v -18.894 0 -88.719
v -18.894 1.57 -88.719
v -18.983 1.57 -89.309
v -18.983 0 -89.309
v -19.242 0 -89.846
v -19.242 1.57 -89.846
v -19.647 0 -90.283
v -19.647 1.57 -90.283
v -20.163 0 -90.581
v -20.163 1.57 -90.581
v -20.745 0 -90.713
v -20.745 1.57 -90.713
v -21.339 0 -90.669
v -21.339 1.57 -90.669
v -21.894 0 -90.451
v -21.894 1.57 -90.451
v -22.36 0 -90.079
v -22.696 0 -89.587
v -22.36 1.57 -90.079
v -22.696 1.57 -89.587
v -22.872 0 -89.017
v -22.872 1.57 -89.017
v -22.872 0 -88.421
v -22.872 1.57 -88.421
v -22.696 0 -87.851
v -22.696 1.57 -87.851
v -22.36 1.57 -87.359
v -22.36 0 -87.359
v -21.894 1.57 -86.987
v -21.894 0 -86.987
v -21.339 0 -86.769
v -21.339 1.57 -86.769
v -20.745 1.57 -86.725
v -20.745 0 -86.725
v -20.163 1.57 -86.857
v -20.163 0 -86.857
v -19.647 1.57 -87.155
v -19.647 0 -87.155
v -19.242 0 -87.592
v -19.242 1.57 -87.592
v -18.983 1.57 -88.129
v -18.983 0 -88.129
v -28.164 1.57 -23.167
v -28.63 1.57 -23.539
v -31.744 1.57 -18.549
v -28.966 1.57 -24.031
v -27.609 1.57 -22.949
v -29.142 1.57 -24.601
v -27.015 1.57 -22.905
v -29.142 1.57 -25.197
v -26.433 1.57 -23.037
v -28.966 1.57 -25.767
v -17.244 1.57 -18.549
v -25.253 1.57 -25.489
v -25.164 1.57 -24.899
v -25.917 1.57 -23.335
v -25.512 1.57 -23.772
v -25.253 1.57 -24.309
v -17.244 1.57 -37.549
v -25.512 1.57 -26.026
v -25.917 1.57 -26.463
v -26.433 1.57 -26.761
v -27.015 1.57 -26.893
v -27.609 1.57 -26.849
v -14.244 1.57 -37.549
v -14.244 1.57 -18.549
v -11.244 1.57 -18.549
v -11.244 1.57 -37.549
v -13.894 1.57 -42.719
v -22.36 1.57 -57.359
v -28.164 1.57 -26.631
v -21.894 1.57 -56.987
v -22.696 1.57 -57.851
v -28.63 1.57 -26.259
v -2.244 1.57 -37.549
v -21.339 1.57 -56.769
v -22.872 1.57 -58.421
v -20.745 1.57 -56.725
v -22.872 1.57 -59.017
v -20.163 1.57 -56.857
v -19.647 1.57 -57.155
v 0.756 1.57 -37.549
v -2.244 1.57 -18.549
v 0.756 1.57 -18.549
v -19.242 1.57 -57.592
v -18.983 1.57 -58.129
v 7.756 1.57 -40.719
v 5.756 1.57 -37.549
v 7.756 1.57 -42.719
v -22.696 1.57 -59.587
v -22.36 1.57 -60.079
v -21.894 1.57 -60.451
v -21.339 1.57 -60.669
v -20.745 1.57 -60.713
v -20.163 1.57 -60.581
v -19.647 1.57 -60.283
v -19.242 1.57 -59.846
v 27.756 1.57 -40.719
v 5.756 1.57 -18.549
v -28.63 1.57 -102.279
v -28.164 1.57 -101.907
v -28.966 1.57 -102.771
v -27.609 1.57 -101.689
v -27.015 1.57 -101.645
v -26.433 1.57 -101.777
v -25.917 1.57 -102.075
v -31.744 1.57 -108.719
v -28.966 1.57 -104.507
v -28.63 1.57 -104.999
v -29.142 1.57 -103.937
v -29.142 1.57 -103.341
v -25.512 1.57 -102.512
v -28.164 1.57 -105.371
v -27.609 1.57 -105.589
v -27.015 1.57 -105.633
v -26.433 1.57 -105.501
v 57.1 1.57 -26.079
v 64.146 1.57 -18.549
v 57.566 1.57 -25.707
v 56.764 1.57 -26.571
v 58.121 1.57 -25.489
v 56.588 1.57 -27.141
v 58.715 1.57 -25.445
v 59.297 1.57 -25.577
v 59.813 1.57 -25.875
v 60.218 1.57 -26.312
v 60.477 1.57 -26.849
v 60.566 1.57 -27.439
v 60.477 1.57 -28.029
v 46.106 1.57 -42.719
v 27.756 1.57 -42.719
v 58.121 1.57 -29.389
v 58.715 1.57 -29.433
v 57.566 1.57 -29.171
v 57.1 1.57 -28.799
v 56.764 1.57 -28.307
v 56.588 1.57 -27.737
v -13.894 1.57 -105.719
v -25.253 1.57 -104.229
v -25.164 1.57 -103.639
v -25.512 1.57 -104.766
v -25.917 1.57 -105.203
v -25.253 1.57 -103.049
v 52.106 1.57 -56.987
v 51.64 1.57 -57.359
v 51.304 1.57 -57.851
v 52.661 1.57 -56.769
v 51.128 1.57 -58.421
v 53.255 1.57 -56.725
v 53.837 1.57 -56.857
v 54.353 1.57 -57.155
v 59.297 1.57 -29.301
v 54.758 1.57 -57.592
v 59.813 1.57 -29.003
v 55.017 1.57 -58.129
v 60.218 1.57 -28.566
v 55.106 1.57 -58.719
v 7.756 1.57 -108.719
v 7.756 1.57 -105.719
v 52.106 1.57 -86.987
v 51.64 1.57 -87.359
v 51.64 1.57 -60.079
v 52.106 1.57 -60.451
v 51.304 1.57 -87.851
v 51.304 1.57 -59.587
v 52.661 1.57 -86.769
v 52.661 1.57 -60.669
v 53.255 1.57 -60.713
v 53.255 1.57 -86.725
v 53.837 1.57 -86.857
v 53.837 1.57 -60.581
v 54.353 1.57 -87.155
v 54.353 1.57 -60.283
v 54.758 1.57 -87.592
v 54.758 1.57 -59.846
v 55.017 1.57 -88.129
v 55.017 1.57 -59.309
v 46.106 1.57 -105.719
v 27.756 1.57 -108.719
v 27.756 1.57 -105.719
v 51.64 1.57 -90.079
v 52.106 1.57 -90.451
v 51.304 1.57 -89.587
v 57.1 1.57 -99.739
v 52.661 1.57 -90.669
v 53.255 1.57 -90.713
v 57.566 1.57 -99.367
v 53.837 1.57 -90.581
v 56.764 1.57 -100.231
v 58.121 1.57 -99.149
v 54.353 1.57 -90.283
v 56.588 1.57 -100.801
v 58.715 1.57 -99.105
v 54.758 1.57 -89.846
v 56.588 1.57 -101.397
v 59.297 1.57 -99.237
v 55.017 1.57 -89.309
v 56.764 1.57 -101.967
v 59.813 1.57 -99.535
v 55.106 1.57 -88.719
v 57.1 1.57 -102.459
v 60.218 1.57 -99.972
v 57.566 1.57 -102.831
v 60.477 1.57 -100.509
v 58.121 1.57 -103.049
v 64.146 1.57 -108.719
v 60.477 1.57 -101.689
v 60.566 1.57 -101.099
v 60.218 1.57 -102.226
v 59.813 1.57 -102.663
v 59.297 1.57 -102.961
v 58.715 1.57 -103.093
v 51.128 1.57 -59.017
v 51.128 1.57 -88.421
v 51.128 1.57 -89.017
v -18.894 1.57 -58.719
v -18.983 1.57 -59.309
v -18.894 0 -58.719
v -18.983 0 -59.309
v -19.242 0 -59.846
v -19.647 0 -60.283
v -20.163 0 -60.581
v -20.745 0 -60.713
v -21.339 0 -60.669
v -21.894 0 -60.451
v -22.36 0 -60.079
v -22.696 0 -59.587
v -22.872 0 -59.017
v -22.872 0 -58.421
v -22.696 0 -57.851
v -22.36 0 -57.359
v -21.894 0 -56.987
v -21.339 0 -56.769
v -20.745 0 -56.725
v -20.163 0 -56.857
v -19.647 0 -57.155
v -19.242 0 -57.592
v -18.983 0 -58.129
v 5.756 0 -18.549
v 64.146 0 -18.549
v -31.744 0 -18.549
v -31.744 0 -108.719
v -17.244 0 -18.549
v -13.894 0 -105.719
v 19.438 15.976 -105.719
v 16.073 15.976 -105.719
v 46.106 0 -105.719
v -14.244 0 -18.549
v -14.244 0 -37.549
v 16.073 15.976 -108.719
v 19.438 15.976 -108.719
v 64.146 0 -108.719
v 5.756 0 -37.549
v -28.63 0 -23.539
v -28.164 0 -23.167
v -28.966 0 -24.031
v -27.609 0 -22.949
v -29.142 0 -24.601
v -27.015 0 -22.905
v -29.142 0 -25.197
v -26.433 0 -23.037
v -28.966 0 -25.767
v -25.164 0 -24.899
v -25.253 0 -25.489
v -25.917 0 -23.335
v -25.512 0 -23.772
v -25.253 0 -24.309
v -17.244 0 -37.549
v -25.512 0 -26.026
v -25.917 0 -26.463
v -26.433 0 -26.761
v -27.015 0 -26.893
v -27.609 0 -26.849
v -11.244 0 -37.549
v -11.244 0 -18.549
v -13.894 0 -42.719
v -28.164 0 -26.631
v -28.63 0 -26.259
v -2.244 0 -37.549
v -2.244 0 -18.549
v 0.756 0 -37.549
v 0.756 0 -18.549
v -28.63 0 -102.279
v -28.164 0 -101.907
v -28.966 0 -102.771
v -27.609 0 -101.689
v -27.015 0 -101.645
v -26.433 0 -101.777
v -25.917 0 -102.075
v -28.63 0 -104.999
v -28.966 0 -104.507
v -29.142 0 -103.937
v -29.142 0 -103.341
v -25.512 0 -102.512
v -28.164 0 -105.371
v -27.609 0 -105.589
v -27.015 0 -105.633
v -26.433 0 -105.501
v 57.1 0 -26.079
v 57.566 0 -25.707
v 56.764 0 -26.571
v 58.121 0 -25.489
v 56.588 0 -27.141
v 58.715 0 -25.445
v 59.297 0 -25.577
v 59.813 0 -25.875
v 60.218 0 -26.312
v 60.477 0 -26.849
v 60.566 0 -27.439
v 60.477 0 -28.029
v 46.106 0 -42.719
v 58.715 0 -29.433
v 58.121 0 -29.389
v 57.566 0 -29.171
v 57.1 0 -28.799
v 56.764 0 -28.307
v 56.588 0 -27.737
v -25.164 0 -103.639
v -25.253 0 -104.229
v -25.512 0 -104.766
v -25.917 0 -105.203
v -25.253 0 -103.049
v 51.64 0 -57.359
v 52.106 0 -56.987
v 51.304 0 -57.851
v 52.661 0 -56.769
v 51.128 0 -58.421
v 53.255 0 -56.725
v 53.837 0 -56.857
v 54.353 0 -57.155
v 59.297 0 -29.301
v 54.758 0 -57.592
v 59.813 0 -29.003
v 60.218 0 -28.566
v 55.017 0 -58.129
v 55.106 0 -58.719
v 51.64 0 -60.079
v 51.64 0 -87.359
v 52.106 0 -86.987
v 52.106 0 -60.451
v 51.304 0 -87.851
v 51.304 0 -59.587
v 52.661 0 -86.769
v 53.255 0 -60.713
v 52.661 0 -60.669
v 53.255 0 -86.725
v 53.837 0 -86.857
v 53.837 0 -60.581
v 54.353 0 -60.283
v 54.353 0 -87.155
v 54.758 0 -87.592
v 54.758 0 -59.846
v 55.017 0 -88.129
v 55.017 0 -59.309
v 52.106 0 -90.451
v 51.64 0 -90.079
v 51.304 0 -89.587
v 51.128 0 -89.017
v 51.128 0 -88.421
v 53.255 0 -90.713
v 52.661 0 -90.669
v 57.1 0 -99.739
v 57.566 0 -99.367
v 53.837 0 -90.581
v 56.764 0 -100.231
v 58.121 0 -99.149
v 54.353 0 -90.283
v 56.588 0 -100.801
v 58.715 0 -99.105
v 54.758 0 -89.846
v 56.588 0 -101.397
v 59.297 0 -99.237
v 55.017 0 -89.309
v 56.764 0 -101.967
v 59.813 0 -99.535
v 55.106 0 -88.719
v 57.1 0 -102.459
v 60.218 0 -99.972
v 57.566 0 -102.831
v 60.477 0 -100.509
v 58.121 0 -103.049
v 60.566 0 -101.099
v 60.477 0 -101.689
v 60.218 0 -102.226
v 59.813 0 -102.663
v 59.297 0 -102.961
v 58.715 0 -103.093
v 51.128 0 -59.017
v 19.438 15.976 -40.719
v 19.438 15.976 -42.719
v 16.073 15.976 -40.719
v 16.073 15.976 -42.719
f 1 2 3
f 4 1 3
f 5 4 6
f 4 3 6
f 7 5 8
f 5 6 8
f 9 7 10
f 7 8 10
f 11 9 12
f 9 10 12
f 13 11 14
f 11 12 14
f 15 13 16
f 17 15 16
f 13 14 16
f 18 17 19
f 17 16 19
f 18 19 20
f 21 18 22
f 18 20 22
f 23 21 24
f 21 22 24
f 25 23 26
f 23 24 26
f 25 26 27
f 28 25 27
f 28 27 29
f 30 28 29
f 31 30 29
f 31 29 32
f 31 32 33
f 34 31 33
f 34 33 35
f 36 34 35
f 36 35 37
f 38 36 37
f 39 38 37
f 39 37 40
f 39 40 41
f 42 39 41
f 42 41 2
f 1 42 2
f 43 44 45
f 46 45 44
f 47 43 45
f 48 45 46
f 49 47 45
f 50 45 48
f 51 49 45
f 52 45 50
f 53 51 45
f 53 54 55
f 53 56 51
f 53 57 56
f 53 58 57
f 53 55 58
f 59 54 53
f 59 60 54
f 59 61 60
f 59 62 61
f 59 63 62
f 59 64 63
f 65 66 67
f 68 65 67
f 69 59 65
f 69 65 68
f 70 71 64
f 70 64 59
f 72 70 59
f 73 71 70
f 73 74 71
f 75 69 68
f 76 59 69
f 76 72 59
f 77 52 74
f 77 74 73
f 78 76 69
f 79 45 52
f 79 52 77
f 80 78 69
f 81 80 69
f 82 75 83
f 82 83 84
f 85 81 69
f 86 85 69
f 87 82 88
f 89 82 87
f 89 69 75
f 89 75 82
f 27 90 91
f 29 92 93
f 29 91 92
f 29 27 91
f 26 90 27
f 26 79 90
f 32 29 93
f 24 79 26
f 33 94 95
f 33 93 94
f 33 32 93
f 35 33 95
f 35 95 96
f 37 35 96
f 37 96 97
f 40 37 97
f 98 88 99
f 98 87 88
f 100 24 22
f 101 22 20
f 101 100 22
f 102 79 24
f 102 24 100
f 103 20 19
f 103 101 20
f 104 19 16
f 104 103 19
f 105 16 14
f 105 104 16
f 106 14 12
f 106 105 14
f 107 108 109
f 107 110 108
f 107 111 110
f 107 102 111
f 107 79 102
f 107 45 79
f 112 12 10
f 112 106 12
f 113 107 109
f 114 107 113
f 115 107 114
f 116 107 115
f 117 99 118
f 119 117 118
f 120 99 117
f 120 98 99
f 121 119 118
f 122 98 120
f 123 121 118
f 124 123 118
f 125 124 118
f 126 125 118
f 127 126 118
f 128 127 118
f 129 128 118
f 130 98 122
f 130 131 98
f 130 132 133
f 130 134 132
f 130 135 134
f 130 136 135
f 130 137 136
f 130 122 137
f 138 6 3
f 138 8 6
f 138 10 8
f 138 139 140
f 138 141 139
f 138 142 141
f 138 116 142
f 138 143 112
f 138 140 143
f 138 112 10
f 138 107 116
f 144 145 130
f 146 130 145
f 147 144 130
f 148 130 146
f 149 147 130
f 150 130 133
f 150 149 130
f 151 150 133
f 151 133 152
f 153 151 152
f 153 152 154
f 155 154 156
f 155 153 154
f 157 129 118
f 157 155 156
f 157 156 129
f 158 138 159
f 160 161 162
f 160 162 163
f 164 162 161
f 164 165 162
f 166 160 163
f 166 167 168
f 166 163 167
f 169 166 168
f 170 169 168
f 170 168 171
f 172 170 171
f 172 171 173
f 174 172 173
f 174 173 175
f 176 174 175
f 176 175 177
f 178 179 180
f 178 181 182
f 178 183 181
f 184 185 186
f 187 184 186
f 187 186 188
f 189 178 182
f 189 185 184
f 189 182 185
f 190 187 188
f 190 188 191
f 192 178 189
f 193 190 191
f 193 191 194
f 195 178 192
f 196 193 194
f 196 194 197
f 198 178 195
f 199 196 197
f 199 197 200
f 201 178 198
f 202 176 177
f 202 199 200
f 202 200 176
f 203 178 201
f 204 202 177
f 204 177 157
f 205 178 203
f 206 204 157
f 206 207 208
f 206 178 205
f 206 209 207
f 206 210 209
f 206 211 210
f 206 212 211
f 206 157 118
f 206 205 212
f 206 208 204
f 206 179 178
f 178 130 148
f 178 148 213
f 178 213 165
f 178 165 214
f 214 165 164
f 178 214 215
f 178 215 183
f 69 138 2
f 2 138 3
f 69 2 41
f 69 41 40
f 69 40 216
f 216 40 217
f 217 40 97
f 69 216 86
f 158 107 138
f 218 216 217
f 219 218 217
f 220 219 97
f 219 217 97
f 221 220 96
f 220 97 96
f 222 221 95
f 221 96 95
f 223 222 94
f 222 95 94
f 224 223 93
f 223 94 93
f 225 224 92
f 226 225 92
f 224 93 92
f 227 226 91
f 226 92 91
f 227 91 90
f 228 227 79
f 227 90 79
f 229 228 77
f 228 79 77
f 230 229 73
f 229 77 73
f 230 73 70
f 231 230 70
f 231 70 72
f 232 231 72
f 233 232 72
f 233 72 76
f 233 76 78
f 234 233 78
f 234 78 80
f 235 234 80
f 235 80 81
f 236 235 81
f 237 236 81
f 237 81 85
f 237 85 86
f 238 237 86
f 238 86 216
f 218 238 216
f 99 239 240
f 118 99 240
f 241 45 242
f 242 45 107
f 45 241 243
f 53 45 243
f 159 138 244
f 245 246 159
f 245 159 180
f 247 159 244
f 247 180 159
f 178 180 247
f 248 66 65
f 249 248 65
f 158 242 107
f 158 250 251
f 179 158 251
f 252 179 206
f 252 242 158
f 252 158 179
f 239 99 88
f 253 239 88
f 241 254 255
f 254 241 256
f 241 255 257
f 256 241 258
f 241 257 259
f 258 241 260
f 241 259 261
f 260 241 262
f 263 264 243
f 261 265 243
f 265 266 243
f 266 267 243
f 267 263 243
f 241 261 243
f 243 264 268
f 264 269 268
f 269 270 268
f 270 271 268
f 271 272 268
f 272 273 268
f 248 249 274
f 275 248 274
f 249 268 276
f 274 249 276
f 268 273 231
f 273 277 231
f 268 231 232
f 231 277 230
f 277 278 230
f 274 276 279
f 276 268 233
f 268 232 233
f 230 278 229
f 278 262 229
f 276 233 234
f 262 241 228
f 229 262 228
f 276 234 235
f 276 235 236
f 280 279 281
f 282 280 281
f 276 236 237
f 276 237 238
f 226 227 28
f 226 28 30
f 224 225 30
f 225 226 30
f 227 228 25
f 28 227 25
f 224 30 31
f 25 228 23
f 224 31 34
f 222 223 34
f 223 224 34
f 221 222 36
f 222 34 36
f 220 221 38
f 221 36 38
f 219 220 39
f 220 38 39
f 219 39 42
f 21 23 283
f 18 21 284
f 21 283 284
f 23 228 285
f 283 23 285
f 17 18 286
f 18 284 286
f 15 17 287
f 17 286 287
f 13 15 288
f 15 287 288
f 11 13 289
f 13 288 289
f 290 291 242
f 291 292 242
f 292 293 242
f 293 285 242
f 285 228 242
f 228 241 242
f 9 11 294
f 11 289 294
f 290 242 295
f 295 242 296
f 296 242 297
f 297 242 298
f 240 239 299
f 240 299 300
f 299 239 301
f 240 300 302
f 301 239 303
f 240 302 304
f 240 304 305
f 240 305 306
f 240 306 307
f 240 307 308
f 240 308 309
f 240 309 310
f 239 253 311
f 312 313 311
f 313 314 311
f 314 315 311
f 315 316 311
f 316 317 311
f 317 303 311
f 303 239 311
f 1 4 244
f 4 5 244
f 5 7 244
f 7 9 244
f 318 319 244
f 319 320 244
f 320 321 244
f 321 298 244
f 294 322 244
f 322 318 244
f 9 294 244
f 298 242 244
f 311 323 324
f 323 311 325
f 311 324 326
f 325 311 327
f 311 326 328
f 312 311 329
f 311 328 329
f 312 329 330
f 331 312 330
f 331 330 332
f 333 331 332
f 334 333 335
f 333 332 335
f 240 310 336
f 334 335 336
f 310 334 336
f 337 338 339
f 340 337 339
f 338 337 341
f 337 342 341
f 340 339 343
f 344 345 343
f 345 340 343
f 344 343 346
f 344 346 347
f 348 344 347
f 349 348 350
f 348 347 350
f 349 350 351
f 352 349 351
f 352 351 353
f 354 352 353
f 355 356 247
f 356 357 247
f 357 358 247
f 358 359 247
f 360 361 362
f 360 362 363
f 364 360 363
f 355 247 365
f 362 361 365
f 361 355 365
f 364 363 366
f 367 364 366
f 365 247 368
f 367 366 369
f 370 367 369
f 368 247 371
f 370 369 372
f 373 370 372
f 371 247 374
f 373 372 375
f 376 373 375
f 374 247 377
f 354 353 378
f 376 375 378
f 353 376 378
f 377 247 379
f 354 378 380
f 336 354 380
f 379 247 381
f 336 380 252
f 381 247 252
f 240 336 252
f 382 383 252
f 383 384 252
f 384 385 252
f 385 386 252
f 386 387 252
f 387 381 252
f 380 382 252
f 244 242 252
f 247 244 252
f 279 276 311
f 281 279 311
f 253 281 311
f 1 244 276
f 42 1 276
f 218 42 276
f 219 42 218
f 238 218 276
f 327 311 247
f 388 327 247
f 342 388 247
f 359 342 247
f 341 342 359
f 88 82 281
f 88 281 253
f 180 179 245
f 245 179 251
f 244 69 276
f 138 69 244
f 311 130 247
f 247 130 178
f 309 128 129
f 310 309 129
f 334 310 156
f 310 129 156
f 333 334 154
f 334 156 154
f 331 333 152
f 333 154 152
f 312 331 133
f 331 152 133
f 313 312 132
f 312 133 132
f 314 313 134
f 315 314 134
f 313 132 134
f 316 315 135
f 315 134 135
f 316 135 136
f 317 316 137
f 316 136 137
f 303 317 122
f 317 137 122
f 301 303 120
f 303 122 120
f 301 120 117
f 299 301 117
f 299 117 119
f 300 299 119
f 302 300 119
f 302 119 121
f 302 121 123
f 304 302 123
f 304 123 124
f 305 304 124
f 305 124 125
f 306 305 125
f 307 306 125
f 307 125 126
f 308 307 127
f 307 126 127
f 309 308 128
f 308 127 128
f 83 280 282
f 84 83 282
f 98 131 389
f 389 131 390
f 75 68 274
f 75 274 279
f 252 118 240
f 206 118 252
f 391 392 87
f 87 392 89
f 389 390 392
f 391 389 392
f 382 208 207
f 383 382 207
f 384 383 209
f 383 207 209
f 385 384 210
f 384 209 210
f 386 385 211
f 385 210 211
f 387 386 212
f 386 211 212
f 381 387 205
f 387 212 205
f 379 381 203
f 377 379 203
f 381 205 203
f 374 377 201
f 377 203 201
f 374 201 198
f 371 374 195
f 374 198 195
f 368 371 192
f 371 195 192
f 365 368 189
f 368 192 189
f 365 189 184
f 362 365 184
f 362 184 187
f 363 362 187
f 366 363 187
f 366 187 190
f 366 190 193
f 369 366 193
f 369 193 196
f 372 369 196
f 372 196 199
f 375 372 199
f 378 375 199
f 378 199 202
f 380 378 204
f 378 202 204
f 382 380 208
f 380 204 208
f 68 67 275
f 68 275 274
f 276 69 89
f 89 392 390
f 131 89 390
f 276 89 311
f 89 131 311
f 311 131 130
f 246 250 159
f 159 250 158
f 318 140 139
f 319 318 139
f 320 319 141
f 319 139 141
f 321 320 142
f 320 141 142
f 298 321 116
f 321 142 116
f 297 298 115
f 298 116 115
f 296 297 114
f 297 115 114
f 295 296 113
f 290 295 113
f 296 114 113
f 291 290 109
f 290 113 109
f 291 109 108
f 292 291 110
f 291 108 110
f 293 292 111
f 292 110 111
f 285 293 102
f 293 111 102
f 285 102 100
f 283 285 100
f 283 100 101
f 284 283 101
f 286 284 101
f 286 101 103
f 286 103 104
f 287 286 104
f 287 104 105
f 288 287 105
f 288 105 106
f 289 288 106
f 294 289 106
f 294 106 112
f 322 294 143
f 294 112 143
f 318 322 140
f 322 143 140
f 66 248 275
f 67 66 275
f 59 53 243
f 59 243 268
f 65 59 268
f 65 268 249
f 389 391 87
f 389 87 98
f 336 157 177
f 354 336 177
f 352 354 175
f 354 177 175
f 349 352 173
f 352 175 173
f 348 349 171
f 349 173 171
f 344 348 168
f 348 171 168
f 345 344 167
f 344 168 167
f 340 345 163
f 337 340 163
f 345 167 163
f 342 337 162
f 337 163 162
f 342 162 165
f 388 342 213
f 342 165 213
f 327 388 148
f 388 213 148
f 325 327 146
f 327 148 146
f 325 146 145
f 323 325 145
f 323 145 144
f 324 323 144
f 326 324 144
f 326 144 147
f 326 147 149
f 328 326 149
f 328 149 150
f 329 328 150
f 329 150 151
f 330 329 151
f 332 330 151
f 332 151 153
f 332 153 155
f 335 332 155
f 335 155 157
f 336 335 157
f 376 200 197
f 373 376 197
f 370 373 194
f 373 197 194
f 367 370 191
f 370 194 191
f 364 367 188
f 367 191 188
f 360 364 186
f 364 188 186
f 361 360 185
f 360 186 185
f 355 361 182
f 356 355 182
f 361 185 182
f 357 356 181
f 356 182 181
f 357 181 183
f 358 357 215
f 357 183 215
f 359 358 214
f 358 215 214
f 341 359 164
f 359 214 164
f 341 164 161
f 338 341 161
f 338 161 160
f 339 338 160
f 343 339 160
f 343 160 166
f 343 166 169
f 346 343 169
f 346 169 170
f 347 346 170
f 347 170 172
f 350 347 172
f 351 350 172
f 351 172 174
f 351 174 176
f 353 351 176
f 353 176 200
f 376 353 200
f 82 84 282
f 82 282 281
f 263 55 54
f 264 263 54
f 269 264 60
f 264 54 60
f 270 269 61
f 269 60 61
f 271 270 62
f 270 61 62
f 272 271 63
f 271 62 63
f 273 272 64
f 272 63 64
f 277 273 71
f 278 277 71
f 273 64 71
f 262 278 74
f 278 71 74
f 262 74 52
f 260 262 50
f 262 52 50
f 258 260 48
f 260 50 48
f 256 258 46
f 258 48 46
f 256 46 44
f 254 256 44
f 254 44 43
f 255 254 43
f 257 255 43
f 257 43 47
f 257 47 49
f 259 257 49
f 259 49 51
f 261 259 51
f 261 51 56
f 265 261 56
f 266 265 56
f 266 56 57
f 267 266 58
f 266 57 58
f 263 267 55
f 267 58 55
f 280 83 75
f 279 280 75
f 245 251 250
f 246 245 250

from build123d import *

# Parameters (mm, degrees)
SKETCH1_W               = 96.89
SKETCH1_H               = 90.17
PCB_DEPTH               = 1.57
SKETCH2_R               = 2
M3_MOUNTING_HOLES_DEPTH = 1.57
SKETCH4_R               = 2
CUT_EXTRUDE1_DEPTH      = 23
BOSS_EXTRUDE2_DEPTH     = 2
BOSS_EXTRUDE3_DEPTH     = 3
SKETCH9_W               = 3
SKETCH9_H               = 19
SKETCH9_W_2             = 9
SKETCH9_W_3             = 5
CUT_EXTRUDE2_DEPTH      = 2.57
SKETCH10_W              = 0.5
SKETCH10_H              = 90.17
CUT_EXTRUDE3_DEPTH      = 10
SKETCH11_W              = 60
SKETCH11_H              = 63
CUT_EXTRUDE4_DEPTH      = 10


with BuildPart() as part:
    # Sketch1 → PCB (new body)
    with BuildSketch(Plane(origin=(0, 0, 0), x_dir=(1, 0, 0), z_dir=(0, 1, 0))):
        with Locations((16.200949951, 63.633996534)):
            Rectangle(SKETCH1_W, SKETCH1_H)
    extrude(amount=PCB_DEPTH)

    # Sketch2 → M3 Mounting Holes (cut)
    with BuildSketch(Plane(origin=(0, 1.57, 0), x_dir=(1, 0, 0), z_dir=(0, 1, 0))):
        with Locations((58.565949951, 27.438996534)):
            Circle(SKETCH2_R)
        with Locations((-27.164050049, 24.898996534)):
            Circle(SKETCH2_R)
        with Locations((-27.164050049, 103.638996534)):
            Circle(SKETCH2_R)
        with Locations((58.565949951, 101.098996534)):
            Circle(SKETCH2_R)
    extrude(amount=-M3_MOUNTING_HOLES_DEPTH, mode=Mode.SUBTRACT)

    # Sketch4 → Cut-Extrude1 (cut)
    with BuildSketch(Plane(origin=(0, 1.57, 0), x_dir=(1, 0, 0), z_dir=(0, 1, 0))):
        with Locations((-20.894050049, 88.718996534)):
            Circle(SKETCH4_R)
        with Locations((53.105949951, 88.718996534)):
            Circle(SKETCH4_R)
        with Locations((-20.894050049, 58.718996534)):
            Circle(SKETCH4_R)
        with Locations((53.105949951, 58.718996534)):
            Circle(SKETCH4_R)
    extrude(amount=-CUT_EXTRUDE1_DEPTH, mode=Mode.SUBTRACT)

    # Sketch7 → Boss-Extrude2 (add)
    with BuildSketch(Plane.XY.offset(-42.718996534)):
        Polygon((27.755949951, 1.57), (19.438412086, 15.976398176), (16.073487816, 15.976398176), (7.755949951, 1.57), align=None)
    extrude(amount=BOSS_EXTRUDE2_DEPTH)

    # Sketch8 → Boss-Extrude3 (add)
    with BuildSketch(Plane.XY.offset(-108.718996534)):
        Polygon((27.755949951, 1.57), (19.438412086, 15.976398176), (16.073487816, 15.976398176), (7.755949951, 1.57), align=None)
    extrude(amount=BOSS_EXTRUDE3_DEPTH)

    # Sketch9 → Cut-Extrude2 (cut, through all)
    with BuildSketch(Plane(origin=(0, 1.57, 0), x_dir=(1, 0, 0), z_dir=(0, 1, 0))):
        with Locations((-15.744050049, 28.048996534)):
            Rectangle(SKETCH9_W, SKETCH9_H)
        with Locations((-6.744050049, 28.048996534)):
            Rectangle(SKETCH9_W_2, SKETCH9_H)
        with Locations((3.255949951, 28.048996534)):
            Rectangle(SKETCH9_W_3, SKETCH9_H)
    extrude(amount=-CUT_EXTRUDE2_DEPTH, mode=Mode.SUBTRACT)

    # Sketch10 → Cut-Extrude3 (cut)
    with BuildSketch(Plane(origin=(0, 1.57, 0), x_dir=(1, 0, 0), z_dir=(0, 1, 0))):
        with Locations((-31.994050049, 63.633996534)):
            Rectangle(SKETCH10_W, SKETCH10_H)
        with Locations((64.395949951, 63.633996534)):
            Rectangle(SKETCH10_W, SKETCH10_H)
    extrude(amount=-CUT_EXTRUDE3_DEPTH, mode=Mode.SUBTRACT)

    # Sketch11 → Cut-Extrude4 (cut)
    with BuildSketch(Plane(origin=(0, 1.57, 0), x_dir=(1, 0, 0), z_dir=(0, 1, 0))):
        with Locations((16.105949951, 74.218996534)):
            Rectangle(SKETCH11_W, SKETCH11_H)
    extrude(amount=-CUT_EXTRUDE4_DEPTH, mode=Mode.SUBTRACT)


solid = part.part
